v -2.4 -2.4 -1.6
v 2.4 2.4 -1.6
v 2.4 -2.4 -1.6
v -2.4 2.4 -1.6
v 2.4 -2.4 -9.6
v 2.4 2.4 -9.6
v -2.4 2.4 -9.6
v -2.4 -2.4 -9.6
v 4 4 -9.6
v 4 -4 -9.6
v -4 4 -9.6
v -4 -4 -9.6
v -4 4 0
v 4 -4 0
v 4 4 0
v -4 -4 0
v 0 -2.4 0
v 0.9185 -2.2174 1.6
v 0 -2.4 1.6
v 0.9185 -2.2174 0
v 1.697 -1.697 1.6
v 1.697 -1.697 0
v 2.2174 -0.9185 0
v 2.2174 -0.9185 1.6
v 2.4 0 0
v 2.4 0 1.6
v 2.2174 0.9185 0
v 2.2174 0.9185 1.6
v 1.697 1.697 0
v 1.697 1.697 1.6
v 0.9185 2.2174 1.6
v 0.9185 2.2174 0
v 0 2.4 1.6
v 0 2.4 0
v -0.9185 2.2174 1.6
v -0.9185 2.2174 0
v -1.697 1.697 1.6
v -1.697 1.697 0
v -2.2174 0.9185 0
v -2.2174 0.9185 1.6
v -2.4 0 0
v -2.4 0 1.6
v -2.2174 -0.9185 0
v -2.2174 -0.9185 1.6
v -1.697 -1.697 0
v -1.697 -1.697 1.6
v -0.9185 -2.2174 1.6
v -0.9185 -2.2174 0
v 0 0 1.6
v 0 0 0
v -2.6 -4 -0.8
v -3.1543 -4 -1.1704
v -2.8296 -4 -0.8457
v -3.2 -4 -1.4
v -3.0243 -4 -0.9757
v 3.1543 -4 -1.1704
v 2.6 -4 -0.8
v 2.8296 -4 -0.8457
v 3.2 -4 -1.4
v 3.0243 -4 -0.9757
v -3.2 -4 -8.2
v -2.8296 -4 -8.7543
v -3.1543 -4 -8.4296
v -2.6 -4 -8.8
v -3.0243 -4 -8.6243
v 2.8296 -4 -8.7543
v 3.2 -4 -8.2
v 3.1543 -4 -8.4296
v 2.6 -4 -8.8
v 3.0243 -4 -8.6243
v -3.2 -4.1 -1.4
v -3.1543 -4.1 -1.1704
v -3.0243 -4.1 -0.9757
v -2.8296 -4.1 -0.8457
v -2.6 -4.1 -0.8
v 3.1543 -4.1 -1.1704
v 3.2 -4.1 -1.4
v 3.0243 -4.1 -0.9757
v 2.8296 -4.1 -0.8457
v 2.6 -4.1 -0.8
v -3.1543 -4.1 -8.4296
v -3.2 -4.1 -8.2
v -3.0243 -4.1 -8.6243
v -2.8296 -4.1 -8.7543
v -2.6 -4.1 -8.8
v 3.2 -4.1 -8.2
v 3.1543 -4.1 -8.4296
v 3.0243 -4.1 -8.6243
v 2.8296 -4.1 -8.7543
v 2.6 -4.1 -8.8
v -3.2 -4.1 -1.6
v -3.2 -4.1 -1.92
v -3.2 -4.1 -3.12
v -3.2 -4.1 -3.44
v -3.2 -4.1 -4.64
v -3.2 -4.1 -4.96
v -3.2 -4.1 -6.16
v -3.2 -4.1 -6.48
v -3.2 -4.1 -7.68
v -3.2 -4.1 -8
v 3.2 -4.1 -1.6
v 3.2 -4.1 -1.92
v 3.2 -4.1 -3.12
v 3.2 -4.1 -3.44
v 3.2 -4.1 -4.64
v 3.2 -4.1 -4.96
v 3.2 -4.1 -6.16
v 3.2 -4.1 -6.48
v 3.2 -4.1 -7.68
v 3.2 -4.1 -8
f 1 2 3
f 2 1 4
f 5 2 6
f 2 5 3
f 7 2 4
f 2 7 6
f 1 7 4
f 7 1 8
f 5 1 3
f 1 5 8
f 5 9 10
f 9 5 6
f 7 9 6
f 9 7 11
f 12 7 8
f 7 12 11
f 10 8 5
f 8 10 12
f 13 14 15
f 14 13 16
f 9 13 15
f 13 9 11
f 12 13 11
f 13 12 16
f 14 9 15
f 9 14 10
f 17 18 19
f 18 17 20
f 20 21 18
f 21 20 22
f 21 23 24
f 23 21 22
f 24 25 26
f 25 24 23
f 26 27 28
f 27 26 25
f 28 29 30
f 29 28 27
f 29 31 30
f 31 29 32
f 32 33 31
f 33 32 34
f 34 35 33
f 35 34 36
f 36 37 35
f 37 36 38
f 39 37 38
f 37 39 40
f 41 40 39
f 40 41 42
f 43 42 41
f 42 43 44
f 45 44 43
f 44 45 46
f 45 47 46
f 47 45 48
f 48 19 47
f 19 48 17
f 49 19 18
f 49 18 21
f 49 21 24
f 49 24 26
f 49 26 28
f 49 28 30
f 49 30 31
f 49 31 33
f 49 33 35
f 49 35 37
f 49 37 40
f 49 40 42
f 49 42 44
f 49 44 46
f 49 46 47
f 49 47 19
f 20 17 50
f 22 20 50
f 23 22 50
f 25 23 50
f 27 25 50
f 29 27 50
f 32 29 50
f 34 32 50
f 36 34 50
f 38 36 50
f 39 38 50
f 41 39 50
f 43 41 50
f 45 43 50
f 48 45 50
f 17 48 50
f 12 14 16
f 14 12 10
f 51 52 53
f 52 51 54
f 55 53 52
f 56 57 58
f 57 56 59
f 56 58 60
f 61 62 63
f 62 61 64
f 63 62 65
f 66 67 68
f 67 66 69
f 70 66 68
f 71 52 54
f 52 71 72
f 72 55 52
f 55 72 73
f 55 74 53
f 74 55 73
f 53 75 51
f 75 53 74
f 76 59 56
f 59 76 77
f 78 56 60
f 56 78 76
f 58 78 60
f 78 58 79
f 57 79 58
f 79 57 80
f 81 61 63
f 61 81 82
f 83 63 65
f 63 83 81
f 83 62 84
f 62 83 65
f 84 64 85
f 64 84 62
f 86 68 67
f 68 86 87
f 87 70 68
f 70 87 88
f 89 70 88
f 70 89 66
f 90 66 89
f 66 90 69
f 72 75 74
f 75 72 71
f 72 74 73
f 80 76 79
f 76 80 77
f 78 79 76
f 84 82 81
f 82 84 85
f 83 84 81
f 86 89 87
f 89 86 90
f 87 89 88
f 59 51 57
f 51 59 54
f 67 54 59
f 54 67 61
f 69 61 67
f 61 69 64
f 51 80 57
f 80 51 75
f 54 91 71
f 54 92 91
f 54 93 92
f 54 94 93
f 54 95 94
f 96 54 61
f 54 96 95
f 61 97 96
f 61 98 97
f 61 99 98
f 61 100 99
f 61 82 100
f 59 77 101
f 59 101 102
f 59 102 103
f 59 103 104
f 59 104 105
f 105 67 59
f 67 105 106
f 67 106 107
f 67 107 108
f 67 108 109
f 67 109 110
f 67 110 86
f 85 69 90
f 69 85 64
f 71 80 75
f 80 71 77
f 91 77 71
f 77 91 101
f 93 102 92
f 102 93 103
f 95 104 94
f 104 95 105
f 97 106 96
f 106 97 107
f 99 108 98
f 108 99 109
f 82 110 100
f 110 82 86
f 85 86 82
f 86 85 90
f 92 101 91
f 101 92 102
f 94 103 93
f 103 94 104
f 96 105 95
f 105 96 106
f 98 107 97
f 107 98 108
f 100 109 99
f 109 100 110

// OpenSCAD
// file: ../p/4-4edge.scad
use <../lib.scad>
function ldraw_lib__4_4edge() = [
// 0 Circle 1.0
// 0 Name: 4-4edge.dat
// 0 Author: James Jessiman
// 0 !LDRAW_ORG Primitive UPDATE 2017-01
// 0 !LICENSE Licensed under CC BY 2.0 and CC BY 4.0 : see CAreadme.txt
// 
// 0 BFC CERTIFY CCW
  [0,"BFC","CERTIFY"],
  [0,"BFC","CCW"],
// 
// 0 !HISTORY 1998-12-15 [PTadmin] Official Update 1998-10
// 0 !HISTORY 2005-12-28 [PTadmin] Official Update 2005-01
// 0 !HISTORY 2007-06-24 [PTadmin] Header formatted for Contributor Agreement
// 0 !HISTORY 2008-07-01 [PTadmin] Official Update 2008-01
// 0 !HISTORY 2017-01-15 [Steffen] BFCed
// 0 !HISTORY 2017-12-30 [PTadmin] Official Update 2017-01
// 
// 
// 2 24 1 0 0 0.9239 0 0.3827
  [2,24,1,0,0,0.9239,0,0.3827],
// 2 24 0.9239 0 0.3827 0.7071 0 0.7071
  [2,24,0.9239,0,0.3827,0.7071,0,0.7071],
// 2 24 0.7071 0 0.7071 0.3827 0 0.9239
  [2,24,0.7071,0,0.7071,0.3827,0,0.9239],
// 2 24 0.3827 0 0.9239 0 0 1
  [2,24,0.3827,0,0.9239,0,0,1],
// 2 24 0 0 1 -0.3827 0 0.9239
  [2,24,0,0,1,-0.3827,0,0.9239],
// 2 24 -0.3827 0 0.9239 -0.7071 0 0.7071
  [2,24,-0.3827,0,0.9239,-0.7071,0,0.7071],
// 2 24 -0.7071 0 0.7071 -0.9239 0 0.3827
  [2,24,-0.7071,0,0.7071,-0.9239,0,0.3827],
// 2 24 -0.9239 0 0.3827 -1 0 -0
  [2,24,-0.9239,0,0.3827,-1,0,-0],
// 2 24 -1 0 -0 -0.9239 0 -0.3827
  [2,24,-1,0,-0,-0.9239,0,-0.3827],
// 2 24 -0.9239 0 -0.3827 -0.7071 0 -0.7071
  [2,24,-0.9239,0,-0.3827,-0.7071,0,-0.7071],
// 2 24 -0.7071 0 -0.7071 -0.3827 0 -0.9239
  [2,24,-0.7071,0,-0.7071,-0.3827,0,-0.9239],
// 2 24 -0.3827 0 -0.9239 0 0 -1
  [2,24,-0.3827,0,-0.9239,0,0,-1],
// 2 24 0 0 -1 0.3827 0 -0.9239
  [2,24,0,0,-1,0.3827,0,-0.9239],
// 2 24 0.3827 0 -0.9239 0.7071 0 -0.7071
  [2,24,0.3827,0,-0.9239,0.7071,0,-0.7071],
// 2 24 0.7071 0 -0.7071 0.9239 0 -0.3827
  [2,24,0.7071,0,-0.7071,0.9239,0,-0.3827],
// 2 24 0.9239 0 -0.3827 1 0 0
  [2,24,0.9239,0,-0.3827,1,0,0],
];
module ldraw_lib__4_4edge(step=0, col=false, unit=2/5, alt=false, line=0.2, solid=!$preview)
    makepoly(ldraw_lib__4_4edge(), step=step, col=col, unit=unit, alt=alt, line=line, solid=solid);
ldraw_lib__4_4edge(line=0.2);
// file: ../p/4-4disc.scad
use <../lib.scad>
function ldraw_lib__4_4disc() = [
// 0 Disc 1.0
// 0 Name: 4-4disc.dat
// 0 Author: James Jessiman
// 0 !LDRAW_ORG Primitive UPDATE 2002-02
// 0 !LICENSE Licensed under CC BY 2.0 and CC BY 4.0 : see CAreadme.txt
// 
// 0 BFC CERTIFY CCW
  [0,"BFC","CERTIFY"],
  [0,"BFC","CCW"],
// 
// 0 !HISTORY 1998-12-15 [PTadmin] Official Update 1998-10
// 0 !HISTORY 2002-03-23 [sbliss] Added BFC statement
// 0 !HISTORY 2002-04-25 [PTadmin] Official Update 2002-02
// 0 !HISTORY 2007-06-24 [PTadmin] Header formatted for Contributor Agreement
// 0 !HISTORY 2008-07-01 [PTadmin] Official Update 2008-01
// 
// 
// 3 16 0 0 0 1 0 0 0.9239 0 0.3827
  [3,16,0,0,0,1,0,0,0.9239,0,0.3827],
// 3 16 0 0 0 0.9239 0 0.3827 0.7071 0 0.7071
  [3,16,0,0,0,0.9239,0,0.3827,0.7071,0,0.7071],
// 3 16 0 0 0 0.7071 0 0.7071 0.3827 0 0.9239
  [3,16,0,0,0,0.7071,0,0.7071,0.3827,0,0.9239],
// 3 16 0 0 0 0.3827 0 0.9239 0 0 1
  [3,16,0,0,0,0.3827,0,0.9239,0,0,1],
// 3 16 0 0 0 0 0 1 -0.3827 0 0.9239
  [3,16,0,0,0,0,0,1,-0.3827,0,0.9239],
// 3 16 0 0 0 -0.3827 0 0.9239 -0.7071 0 0.7071
  [3,16,0,0,0,-0.3827,0,0.9239,-0.7071,0,0.7071],
// 3 16 0 0 0 -0.7071 0 0.7071 -0.9239 0 0.3827
  [3,16,0,0,0,-0.7071,0,0.7071,-0.9239,0,0.3827],
// 3 16 0 0 0 -0.9239 0 0.3827 -1 0 -0
  [3,16,0,0,0,-0.9239,0,0.3827,-1,0,-0],
// 3 16 0 0 0 -1 0 -0 -0.9239 0 -0.3827
  [3,16,0,0,0,-1,0,-0,-0.9239,0,-0.3827],
// 3 16 0 0 0 -0.9239 0 -0.3827 -0.7071 0 -0.7071
  [3,16,0,0,0,-0.9239,0,-0.3827,-0.7071,0,-0.7071],
// 3 16 0 0 0 -0.7071 0 -0.7071 -0.3827 0 -0.9239
  [3,16,0,0,0,-0.7071,0,-0.7071,-0.3827,0,-0.9239],
// 3 16 0 0 0 -0.3827 0 -0.9239 0 0 -1
  [3,16,0,0,0,-0.3827,0,-0.9239,0,0,-1],
// 3 16 0 0 0 0 0 -1 0.3827 0 -0.9239
  [3,16,0,0,0,0,0,-1,0.3827,0,-0.9239],
// 3 16 0 0 0 0.3827 0 -0.9239 0.7071 0 -0.7071
  [3,16,0,0,0,0.3827,0,-0.9239,0.7071,0,-0.7071],
// 3 16 0 0 0 0.7071 0 -0.7071 0.9239 0 -0.3827
  [3,16,0,0,0,0.7071,0,-0.7071,0.9239,0,-0.3827],
// 3 16 0 0 0 0.9239 0 -0.3827 1 0 0
  [3,16,0,0,0,0.9239,0,-0.3827,1,0,0],
// 0
];
module ldraw_lib__4_4disc(step=0, col=false, unit=2/5, alt=false, line=0.2, solid=!$preview)
    makepoly(ldraw_lib__4_4disc(), step=step, col=col, unit=unit, alt=alt, line=line, solid=solid);
ldraw_lib__4_4disc(line=0.2);
// file: ../p/4-4cyli.scad
use <../lib.scad>
$fa=1; $fs=0.2;
function ldraw_lib__4_4cyli(realsolid=false) = [
// 0 Cylinder 1.0
// 0 Name: 4-4cyli.dat
// 0 Author: James Jessiman
// 0 !LDRAW_ORG Primitive UPDATE 2005-01
// 0 !LICENSE Licensed under CC BY 2.0 and CC BY 4.0 : see CAreadme.txt
// 
// 0 BFC CERTIFY CCW
  [0,"BFC","CERTIFY"],
  [0,"BFC","CCW"],
// 
// 0 !HISTORY 1998-12-15 [PTadmin] Official Update 1998-10
// 0 !HISTORY 2002-03-23 [sbliss] Added BFC statement; merged headers from files in distributions LDraw 0.27 and Complete.
// 0 !HISTORY 2002-04-25 [PTadmin] Official Update 2002-02
// 0 !HISTORY 2004-12-14 [guyvivan] BFC CCW
// 0 !HISTORY 2005-12-28 [PTadmin] Official Update 2005-01
// 0 !HISTORY 2007-06-24 [PTadmin] Header formatted for Contributor Agreement
// 0 !HISTORY 2008-07-01 [PTadmin] Official Update 2008-01
// 
// 
// 4 16 1 1 0 0.9239 1 0.3827 0.9239 0 0.3827 1 0 0
  [4,16,1,1,0,0.9239,1,0.3827,0.9239,0,0.3827,1,0,0],
// 5 24 1 0 0 1 1 0 0.9239 0 0.3827 0.9239 0 -0.3827
  [5,24,1,0,0,1,1,0,0.9239,0,0.3827,0.9239,0,-0.3827],
// 4 16 0.9239 1 0.3827 0.7071 1 0.7071 0.7071 0 0.7071 0.9239 0 0.3827
  [4,16,0.9239,1,0.3827,0.7071,1,0.7071,0.7071,0,0.7071,0.9239,0,0.3827],
// 5 24 0.9239 0 0.3827 0.9239 1 0.3827 0.7071 0 0.7071 1 0 0
  [5,24,0.9239,0,0.3827,0.9239,1,0.3827,0.7071,0,0.7071,1,0,0],
// 4 16 0.7071 1 0.7071 0.3827 1 0.9239 0.3827 0 0.9239 0.7071 0 0.7071
  [4,16,0.7071,1,0.7071,0.3827,1,0.9239,0.3827,0,0.9239,0.7071,0,0.7071],
// 5 24 0.7071 0 0.7071 0.7071 1 0.7071 0.3827 0 0.9239 0.9239 0 0.3827
  [5,24,0.7071,0,0.7071,0.7071,1,0.7071,0.3827,0,0.9239,0.9239,0,0.3827],
// 4 16 0.3827 1 0.9239 0 1 1 0 0 1 0.3827 0 0.9239
  [4,16,0.3827,1,0.9239,0,1,1,0,0,1,0.3827,0,0.9239],
// 5 24 0.3827 0 0.9239 0.3827 1 0.9239 0 0 1 0.7071 0 0.7071
  [5,24,0.3827,0,0.9239,0.3827,1,0.9239,0,0,1,0.7071,0,0.7071],
// 4 16 0 1 1 -0.3827 1 0.9239 -0.3827 0 0.9239 0 0 1
  [4,16,0,1,1,-0.3827,1,0.9239,-0.3827,0,0.9239,0,0,1],
// 5 24 0 0 1 0 1 1 -0.3827 0 0.9239 0.3827 0 0.9239
  [5,24,0,0,1,0,1,1,-0.3827,0,0.9239,0.3827,0,0.9239],
// 4 16 -0.3827 1 0.9239 -0.7071 1 0.7071 -0.7071 0 0.7071 -0.3827 0 0.9239
  [4,16,-0.3827,1,0.9239,-0.7071,1,0.7071,-0.7071,0,0.7071,-0.3827,0,0.9239],
// 5 24 -0.3827 0 0.9239 -0.3827 1 0.9239 -0.7071 0 0.7071 0 0 1
  [5,24,-0.3827,0,0.9239,-0.3827,1,0.9239,-0.7071,0,0.7071,0,0,1],
// 4 16 -0.7071 1 0.7071 -0.9239 1 0.3827 -0.9239 0 0.3827 -0.7071 0 0.7071
  [4,16,-0.7071,1,0.7071,-0.9239,1,0.3827,-0.9239,0,0.3827,-0.7071,0,0.7071],
// 5 24 -0.7071 0 0.7071 -0.7071 1 0.7071 -0.9239 0 0.3827 -0.3827 0 0.9239
  [5,24,-0.7071,0,0.7071,-0.7071,1,0.7071,-0.9239,0,0.3827,-0.3827,0,0.9239],
// 4 16 -0.9239 1 0.3827 -1 1 0 -1 0 0 -0.9239 0 0.3827
  [4,16,-0.9239,1,0.3827,-1,1,0,-1,0,0,-0.9239,0,0.3827],
// 5 24 -0.9239 0 0.3827 -0.9239 1 0.3827 -1 0 0 -0.7071 0 0.7071
  [5,24,-0.9239,0,0.3827,-0.9239,1,0.3827,-1,0,0,-0.7071,0,0.7071],
// 4 16 -1 1 0 -0.9239 1 -0.3827 -0.9239 0 -0.3827 -1 0 0
  [4,16,-1,1,0,-0.9239,1,-0.3827,-0.9239,0,-0.3827,-1,0,0],
// 5 24 -1 0 0 -1 1 0 -0.9239 0 -0.3827 -0.9239 0 0.3827
  [5,24,-1,0,0,-1,1,0,-0.9239,0,-0.3827,-0.9239,0,0.3827],
// 4 16 -0.9239 1 -0.3827 -0.7071 1 -0.7071 -0.7071 0 -0.7071 -0.9239 0 -0.3827
  [4,16,-0.9239,1,-0.3827,-0.7071,1,-0.7071,-0.7071,0,-0.7071,-0.9239,0,-0.3827],
// 5 24 -0.9239 0 -0.3827 -0.9239 1 -0.3827 -0.7071 0 -0.7071 -1 0 0
  [5,24,-0.9239,0,-0.3827,-0.9239,1,-0.3827,-0.7071,0,-0.7071,-1,0,0],
// 4 16 -0.7071 1 -0.7071 -0.3827 1 -0.9239 -0.3827 0 -0.9239 -0.7071 0 -0.7071
  [4,16,-0.7071,1,-0.7071,-0.3827,1,-0.9239,-0.3827,0,-0.9239,-0.7071,0,-0.7071],
// 5 24 -0.7071 0 -0.7071 -0.7071 1 -0.7071 -0.3827 0 -0.9239 -0.9239 0 -0.3827
  [5,24,-0.7071,0,-0.7071,-0.7071,1,-0.7071,-0.3827,0,-0.9239,-0.9239,0,-0.3827],
// 4 16 -0.3827 1 -0.9239 0 1 -1 0 0 -1 -0.3827 0 -0.9239
  [4,16,-0.3827,1,-0.9239,0,1,-1,0,0,-1,-0.3827,0,-0.9239],
// 5 24 -0.3827 0 -0.9239 -0.3827 1 -0.9239 0 0 -1 -0.7071 0 -0.7071
  [5,24,-0.3827,0,-0.9239,-0.3827,1,-0.9239,0,0,-1,-0.7071,0,-0.7071],
// 4 16 0 1 -1 0.3827 1 -0.9239 0.3827 0 -0.9239 0 0 -1
  [4,16,0,1,-1,0.3827,1,-0.9239,0.3827,0,-0.9239,0,0,-1],
// 5 24 0 0 -1 0 1 -1 0.3827 0 -0.9239 -0.3827 0 -0.9239
  [5,24,0,0,-1,0,1,-1,0.3827,0,-0.9239,-0.3827,0,-0.9239],
// 4 16 0.3827 1 -0.9239 0.7071 1 -0.7071 0.7071 0 -0.7071 0.3827 0 -0.9239
  [4,16,0.3827,1,-0.9239,0.7071,1,-0.7071,0.7071,0,-0.7071,0.3827,0,-0.9239],
// 5 24 0.3827 0 -0.9239 0.3827 1 -0.9239 0.7071 0 -0.7071 0 0 -1
  [5,24,0.3827,0,-0.9239,0.3827,1,-0.9239,0.7071,0,-0.7071,0,0,-1],
// 4 16 0.7071 1 -0.7071 0.9239 1 -0.3827 0.9239 0 -0.3827 0.7071 0 -0.7071
  [4,16,0.7071,1,-0.7071,0.9239,1,-0.3827,0.9239,0,-0.3827,0.7071,0,-0.7071],
// 5 24 0.7071 0 -0.7071 0.7071 1 -0.7071 0.9239 0 -0.3827 0.3827 0 -0.9239
  [5,24,0.7071,0,-0.7071,0.7071,1,-0.7071,0.9239,0,-0.3827,0.3827,0,-0.9239],
// 4 16 0.9239 1 -0.3827 1 1 0 1 0 0 0.9239 0 -0.3827
  [4,16,0.9239,1,-0.3827,1,1,0,1,0,0,0.9239,0,-0.3827],
// 5 24 0.9239 0 -0.3827 0.9239 1 -0.3827 1 0 0 0.7071 0 -0.7071
  [5,24,0.9239,0,-0.3827,0.9239,1,-0.3827,1,0,0,0.7071,0,-0.7071],
// 0
];
module ldraw_lib__4_4cyli(step=0, col=false, unit=2/5, alt=false, line=0.2, solid=!$preview)
    makepoly(ldraw_lib__4_4cyli(solid), step=step, col=col, unit=unit, alt=alt, line=line, solid=solid);
ldraw_lib__4_4cyli(line=0.2);
// file: ../p/stud.scad
use <../lib.scad>
use <4-4cyli.scad>
use <4-4disc.scad>
use <4-4edge.scad>
function ldraw_lib__stud() = [
// 0 Stud
// 0 Name: stud.dat
// 0 Author: James Jessiman
// 0 !LDRAW_ORG Primitive UPDATE 2012-01
// 0 !LICENSE Licensed under CC BY 4.0 : see CAreadme.txt
// 
// 0 BFC CERTIFY CCW
  [0,"BFC","CERTIFY"],
  [0,"BFC","CCW"],
// 
// 0 !HISTORY 2002-04-04 [sbliss] Modified for BFC compliance
// 0 !HISTORY 2002-04-25 [PTadmin] Official Update 2002-02
// 0 !HISTORY 2007-06-24 [PTadmin] Header formatted for Contributor Agreement
// 0 !HISTORY 2008-07-01 [PTadmin] Official Update 2008-01
// 0 !HISTORY 2012-02-16 [Philo] Changed to CCW
// 0 !HISTORY 2012-03-30 [PTadmin] Official Update 2012-01
// 
// 
// 1 16 0 0 0 6 0 0 0 1 0 0 0 6 4-4edge.dat
  [1,16,0,0,0,6,0,0,0,1,0,0,0,6, ldraw_lib__4_4edge()],
// 1 16 0 -4 0 6 0 0 0 1 0 0 0 6 4-4edge.dat
  [1,16,0,-4,0,6,0,0,0,1,0,0,0,6, ldraw_lib__4_4edge()],
// 1 16 0 0 0 6 0 0 0 -4 0 0 0 6 4-4cyli.dat
  [1,16,0,0,0,6,0,0,0,-4,0,0,0,6, ldraw_lib__4_4cyli()],
// 1 16 0 -4 0 6 0 0 0 1 0 0 0 6 4-4disc.dat
  [1,16,0,-4,0,6,0,0,0,1,0,0,0,6, ldraw_lib__4_4disc()],
  [-1,16,0,0,0,6,0,0,0,-1,0,0,0,6, ldraw_lib__4_4disc()],
];
module ldraw_lib__stud(step=0, col=false, unit=2/5, alt=false, line=0.2, solid=!$preview)
    makepoly(ldraw_lib__stud(), step=step, col=col, unit=unit, alt=alt, line=line, solid=solid);
ldraw_lib__stud(line=0.2);
// file: ../p/box5.scad
use <../lib.scad>
function ldraw_lib__box5() = [
// 0 Box with 5 Faces and All Edges
// 0 Name: box5.dat
// 0 Author: James Jessiman
// 0 !LDRAW_ORG Primitive UPDATE 2012-01
// 0 !LICENSE Licensed under CC BY 2.0 and CC BY 4.0 : see CAreadme.txt
// 
// 0 BFC CERTIFY CCW
  [0,"BFC","CERTIFY"],
  [0,"BFC","CCW"],
// 
// 0 !HISTORY 2002-04-03 [sbliss] Modified for BFC compliance
// 0 !HISTORY 2002-04-25 [PTadmin] Official Update 2002-02
// 0 !HISTORY 2007-06-24 [PTadmin] Header formatted for Contributor Agreement
// 0 !HISTORY 2008-07-01 [PTadmin] Official Update 2008-01
// 0 !HISTORY 2012-02-16 [Philo] Changed to CCW
// 0 !HISTORY 2012-03-30 [PTadmin] Official Update 2012-01
// 
// 
// 2 24 1 1 1 -1 1 1
  [2,24,1,1,1,-1,1,1],
// 2 24 -1 1 1 -1 1 -1
  [2,24,-1,1,1,-1,1,-1],
// 2 24 -1 1 -1 1 1 -1
  [2,24,-1,1,-1,1,1,-1],
// 2 24 1 1 -1 1 1 1
  [2,24,1,1,-1,1,1,1],
// 2 24 1 0 1 -1 0 1
  [2,24,1,0,1,-1,0,1],
// 2 24 -1 0 1 -1 0 -1
  [2,24,-1,0,1,-1,0,-1],
// 2 24 -1 0 -1 1 0 -1
  [2,24,-1,0,-1,1,0,-1],
// 2 24 1 0 -1 1 0 1
  [2,24,1,0,-1,1,0,1],
// 2 24 1 0 1 1 1 1
  [2,24,1,0,1,1,1,1],
// 2 24 -1 0 1 -1 1 1
  [2,24,-1,0,1,-1,1,1],
// 2 24 1 0 -1 1 1 -1
  [2,24,1,0,-1,1,1,-1],
// 2 24 -1 0 -1 -1 1 -1
  [2,24,-1,0,-1,-1,1,-1],
// 4 16 -1 1 1 1 1 1 1 1 -1 -1 1 -1
  [4,16,-1,1,1,1,1,1,1,1,-1,-1,1,-1],
// 4 16 -1 1 1 -1 0 1 1 0 1 1 1 1
  [4,16,-1,1,1,-1,0,1,1,0,1,1,1,1],
// 4 16 -1 1 -1 -1 0 -1 -1 0 1 -1 1 1
  [4,16,-1,1,-1,-1,0,-1,-1,0,1,-1,1,1],
// 4 16 1 1 -1 1 0 -1 -1 0 -1 -1 1 -1
  [4,16,1,1,-1,1,0,-1,-1,0,-1,-1,1,-1],
// 4 16 1 1 1 1 0 1 1 0 -1 1 1 -1
  [4,16,1,1,1,1,0,1,1,0,-1,1,1,-1],
];
makepoly(ldraw_lib__box5(), line=0.2);
// file: ../p/box4t.scad
use <../lib.scad>
function ldraw_lib__box4t() = [
// 0 Box with 4 Adjacent Faces and All Edges
// 0 Name: box4t.dat
// 0 Author: Tore Eriksson [Tore_Eriksson]
// 0 !LDRAW_ORG Primitive UPDATE 2003-02
// 0 !LICENSE Licensed under CC BY 2.0 and CC BY 4.0 : see CAreadme.txt
// 
// 0 BFC CERTIFY CCW
  [0,"BFC","CERTIFY"],
  [0,"BFC","CCW"],
// 
// 0 !HISTORY 1997-09-29 [PTadmin] Official Update 1997-15
// 0 !HISTORY 2002-08-31 [izanette] Modified with WINDZ for BFC compliance
// 0 !HISTORY 2003-08-01 [PTadmin] Official Update 2003-02
// 0 !HISTORY 2007-06-24 [PTadmin] Header formatted for Contributor Agreement
// 0 !HISTORY 2008-07-01 [PTadmin] Official Update 2008-01
// 
// 
// 2 24 1 1 1 -1 1 1
  [2,24,1,1,1,-1,1,1],
// 2 24 -1 1 1 -1 1 -1
  [2,24,-1,1,1,-1,1,-1],
// 2 24 -1 1 -1 1 1 -1
  [2,24,-1,1,-1,1,1,-1],
// 2 24 1 1 -1 1 1 1
  [2,24,1,1,-1,1,1,1],
// 2 24 1 0 1 -1 0 1
  [2,24,1,0,1,-1,0,1],
// 2 24 -1 0 1 -1 0 -1
  [2,24,-1,0,1,-1,0,-1],
// 2 24 -1 0 -1 1 0 -1
  [2,24,-1,0,-1,1,0,-1],
// 2 24 1 0 -1 1 0 1
  [2,24,1,0,-1,1,0,1],
// 2 24 1 0 1 1 1 1
  [2,24,1,0,1,1,1,1],
// 2 24 -1 0 1 -1 1 1
  [2,24,-1,0,1,-1,1,1],
// 2 24 1 0 -1 1 1 -1
  [2,24,1,0,-1,1,1,-1],
// 2 24 -1 0 -1 -1 1 -1
  [2,24,-1,0,-1,-1,1,-1],
// 4 16 1 1 1 1 1 -1 -1 1 -1 -1 1 1
  [4,16,1,1,1,1,1,-1,-1,1,-1,-1,1,1],
// 4 16 1 1 1 -1 1 1 -1 0 1 1 0 1
  [4,16,1,1,1,-1,1,1,-1,0,1,1,0,1],
// 4 16 -1 1 1 -1 1 -1 -1 0 -1 -1 0 1
  [4,16,-1,1,1,-1,1,-1,-1,0,-1,-1,0,1],
// 0 4 16 -1 1 -1 -1 0 -1 1 0 -1 1 1 -1
// 4 16 1 1 -1 1 1 1 1 0 1 1 0 -1
  [4,16,1,1,-1,1,1,1,1,0,1,1,0,-1],
// 0
];
makepoly(ldraw_lib__box4t(), line=0.2);
// file: ../p/1-4cyli.scad
use <../lib.scad>
function ldraw_lib__1_4cyli() = [
// 0 Cylinder 0.25
// 0 Name: 1-4cyli.dat
// 0 Author: James Jessiman
// 0 !LDRAW_ORG Primitive UPDATE 2012-01
// 0 !LICENSE Licensed under CC BY 2.0 and CC BY 4.0 : see CAreadme.txt
// 
// 0 BFC CERTIFY CCW
  [0,"BFC","CERTIFY"],
  [0,"BFC","CCW"],
// 
// 0 !HISTORY 2002-03-23 [sbliss] Added BFC statement.
// 0 !HISTORY 2002-04-25 [PTadmin] Official Update 2002-02
// 0 !HISTORY 2007-06-22 [PTadmin] Header formatted for Contributor Agreement
// 0 !HISTORY 2008-07-01 [PTadmin] Official Update 2008-01
// 0 !HISTORY 2012-02-16 [Philo] Changed to CCW
// 0 !HISTORY 2012-03-30 [PTadmin] Official Update 2012-01
// 
// 
// 4 16 1 1 0 0.9239 1 0.3827 0.9239 0 0.3827 1 0 0
  [4,16,1,1,0,0.9239,1,0.3827,0.9239,0,0.3827,1,0,0],
// 5 24 1 0 0 1 1 0 0.9239 0 0.3827 1 0 -1
  [5,24,1,0,0,1,1,0,0.9239,0,0.3827,1,0,-1],
// 4 16 0.9239 1 0.3827 0.7071 1 0.7071 0.7071 0 0.7071 0.9239 0 0.3827
  [4,16,0.9239,1,0.3827,0.7071,1,0.7071,0.7071,0,0.7071,0.9239,0,0.3827],
// 5 24 0.9239 0 0.3827 0.9239 1 0.3827 0.7071 0 0.7071 1 0 0
  [5,24,0.9239,0,0.3827,0.9239,1,0.3827,0.7071,0,0.7071,1,0,0],
// 4 16 0.7071 1 0.7071 0.3827 1 0.9239 0.3827 0 0.9239 0.7071 0 0.7071
  [4,16,0.7071,1,0.7071,0.3827,1,0.9239,0.3827,0,0.9239,0.7071,0,0.7071],
// 5 24 0.7071 0 0.7071 0.7071 1 0.7071 0.3827 0 0.9239 0.9239 0 0.3827
  [5,24,0.7071,0,0.7071,0.7071,1,0.7071,0.3827,0,0.9239,0.9239,0,0.3827],
// 4 16 0.3827 1 0.9239 0 1 1 0 0 1 0.3827 0 0.9239
  [4,16,0.3827,1,0.9239,0,1,1,0,0,1,0.3827,0,0.9239],
// 5 24 0.3827 0 0.9239 0.3827 1 0.9239 0 0 1 0.7071 0 0.7071
  [5,24,0.3827,0,0.9239,0.3827,1,0.9239,0,0,1,0.7071,0,0.7071],
// 5 24 0 0 1 0 1 1 0.3827 0 0.9239 -1 0 1
  [5,24,0,0,1,0,1,1,0.3827,0,0.9239,-1,0,1],
];
module ldraw_lib__1_4cyli(step=0, col=false, unit=2/5, alt=false, line=0.2, solid=!$preview)
    makepoly(ldraw_lib__1_4cyli(), step=step, col=col, unit=unit, alt=alt, line=line, solid=solid);
ldraw_lib__1_4cyli(line=0.2);
// file: ../p/1-4chrd.scad
use <../lib.scad>
$fa=1; $fs=0.2;
function ldraw_lib__1_4chrd(realsolid=false) = [
// 0 Chord 0.25
// 0 Name: 1-4chrd.dat
// 0 Author: Tony Hafner [hafhead]
// 0 !LDRAW_ORG Primitive UPDATE 2012-02
// 0 !LICENSE Licensed under CC BY 2.0 and CC BY 4.0 : see CAreadme.txt
// 
// 0 BFC CERTIFY CCW
  [0,"BFC","CERTIFY"],
  [0,"BFC","CCW"],
// 
// 0 !HISTORY 2004-04-22 [PTadmin] Official Update 2004-02
// 0 !HISTORY 2007-10-09 [PTadmin] Header formatted for Contributor Agreement
// 0 !HISTORY 2008-07-01 [PTadmin] Official Update 2008-01
// 0 !HISTORY 2012-08-02 [MMR1988] Re-creation with PrimGen2 and Rectifier
// 0 !HISTORY 2012-08-09 [PTadmin] Official Update 2012-02
// 
// 
// 4 16 0.9239 0 0.3827 0.3827 0 0.9239 0 0 1 1 0 0
  [4,16,0.9239,0,0.3827,0.3827,0,0.9239,0,0,1,1,0,0],
// 3 16 0.7071 0 0.7071 0.3827 0 0.9239 0.9239 0 0.3827
  [3,16,0.7071,0,0.7071,0.3827,0,0.9239,0.9239,0,0.3827],
];
module ldraw_lib__1_4chrd(step=0, col=false, unit=2/5, alt=false, line=0.2, solid=!$preview)
    makepoly(ldraw_lib__1_4chrd(solid), step=step, col=col, unit=unit, alt=alt, line=line, solid=solid);
ldraw_lib__1_4chrd(line=0.2);
// file: s/3005s01.scad
use <../../lib.scad>
use <../../p/box4t.scad>
use <../../p/box5.scad>
use <../../p/stud.scad>
function ldraw_lib__s__3005s01() = [
// 0 ~Brick  1 x  1 without Front Face
// 0 Name: s\3005s01.dat
// 0 Author: John Riley [jriley]
// 0 !LDRAW_ORG Subpart UPDATE 2004-01
// 0 !LICENSE Licensed under CC BY 2.0 and CC BY 4.0 : see CAreadme.txt
// 
// 0 BFC CERTIFY CCW
  [0,"BFC","CERTIFY"],
  [0,"BFC","CCW"],
// 
// 0 !HISTORY 2003-09-07 [jriley] BFCed & Subfiled
// 0 !HISTORY 2004-03-02 [PTadmin] Official Update 2004-01
// 0 !HISTORY 2007-08-29 [PTadmin] Header formatted for Contributor Agreement
// 0 !HISTORY 2008-07-01 [PTadmin] Official Update 2008-01
// 
// 
// 0 BFC INVERTNEXT
  [0,"BFC","INVERTNEXT"],
// 1 16 0 24 0 0 0 6 0 -20 0 -6 0 0 box5.dat
  [1,16,0,24,0,0,0,6,0,-20,0,-6,0,0, ldraw_lib__box5()],
// 4 16 10 24 -10 6 24 -6 6 24 6 10 24 10
  [4,16,10,24,-10,6,24,-6,6,24,6,10,24,10],
// 4 16 10 24 10 6 24 6 -6 24 6 -10 24 10
  [4,16,10,24,10,6,24,6,-6,24,6,-10,24,10],
// 4 16 -10 24 10 -6 24 6 -6 24 -6 -10 24 -10
  [4,16,-10,24,10,-6,24,6,-6,24,-6,-10,24,-10],
// 4 16 -10 24 -10 -6 24 -6 6 24 -6 10 24 -10
  [4,16,-10,24,-10,-6,24,-6,6,24,-6,10,24,-10],
// 1 16 0 24 0 10 0 0 0 -24 0 0 0 10 box4t.dat
  [1,16,0,24,0,10,0,0,0,-24,0,0,0,10, ldraw_lib__box4t()],
// 1 16 0 0 0 0 0 1 0 1 0 -1 0 0 stud.dat
  [1,16,0,0,0,0,0,1,0,1,0,-1,0,0, ldraw_lib__stud()],
// 0
];
module ldraw_lib__s__3005s01(step=0, col=false, unit=2/5, alt=false, line=0.2, solid=!$preview)
    makepoly(ldraw_lib__s__3005s01(), step=step, col=col, unit=unit, alt=alt, line=line, solid=solid);
ldraw_lib__s__3005s01(line=0.2);
// file: 6142275h.scad
use <../lib.scad>
use <../p/1-4chrd.scad>
use <../p/1-4cyli.scad>
function ldraw_lib__6142275h() = [
// 0 Sticker  1 x  0.8 with  5 Dark Grey Stripes on Black Background
// 0 Name: 6142275h.dat
// 0 Author: Massimo Maso [Sirio]
// 0 !LDRAW_ORG Part UPDATE 2022-06
// 0 !LICENSE Licensed under CC BY 4.0 : see CAreadme.txt
// 
// 0 BFC CERTIFY CCW
  [0,"BFC","CERTIFY"],
  [0,"BFC","CCW"],
// 
// 0 !KEYWORDS Audi, e-tron, quattro, R18, Set 75872, Speed Champions
// 
// 0 !HISTORY 2022-12-20 [PTadmin] Official Update 2022-06
// 
// 
// 0 // Primitives
// 1 16 -6.5 0 8.5 -1.5 0 0 0 -1 0 0 0 1.5 1-4chrd.dat
  [1,16,-6.5,0,8.5,-1.5,0,0,0,-1,0,0,0,1.5, ldraw_lib__1_4chrd()],
// 1 16 6.5 0 8.5 1.5 0 0 0 -1 0 0 0 1.5 1-4chrd.dat
  [1,16,6.5,0,8.5,1.5,0,0,0,-1,0,0,0,1.5, ldraw_lib__1_4chrd()],
// 1 16 -6.5 0 -8.5 -1.5 0 0 0 -1 0 0 0 -1.5 1-4chrd.dat
  [1,16,-6.5,0,-8.5,-1.5,0,0,0,-1,0,0,0,-1.5, ldraw_lib__1_4chrd()],
// 1 16 6.5 0 -8.5 1.5 0 0 0 -1 0 0 0 -1.5 1-4chrd.dat
  [1,16,6.5,0,-8.5,1.5,0,0,0,-1,0,0,0,-1.5, ldraw_lib__1_4chrd()],
// 1 16 -6.5 0 8.5 -1.5 0 0 0 -.25 0 0 0 1.5 1-4cyli.dat
  [1,16,-6.5,0,8.5,-1.5,0,0,0,-.25,0,0,0,1.5, ldraw_lib__1_4cyli()],
// 1 16 6.5 0 8.5 1.5 0 0 0 -.25 0 0 0 1.5 1-4cyli.dat
  [1,16,6.5,0,8.5,1.5,0,0,0,-.25,0,0,0,1.5, ldraw_lib__1_4cyli()],
// 1 16 -6.5 0 -8.5 -1.5 0 0 0 -.25 0 0 0 -1.5 1-4cyli.dat
  [1,16,-6.5,0,-8.5,-1.5,0,0,0,-.25,0,0,0,-1.5, ldraw_lib__1_4cyli()],
// 1 16 6.5 0 -8.5 1.5 0 0 0 -.25 0 0 0 -1.5 1-4cyli.dat
  [1,16,6.5,0,-8.5,1.5,0,0,0,-.25,0,0,0,-1.5, ldraw_lib__1_4cyli()],
// 1 0 -6.5 -.25 8.5 -1.5 0 0 0 1 0 0 0 1.5 1-4chrd.dat
  [1,0,-6.5,-.25,8.5,-1.5,0,0,0,1,0,0,0,1.5, ldraw_lib__1_4chrd()],
// 1 0 6.5 -.25 8.5 1.5 0 0 0 1 0 0 0 1.5 1-4chrd.dat
  [1,0,6.5,-.25,8.5,1.5,0,0,0,1,0,0,0,1.5, ldraw_lib__1_4chrd()],
// 1 0 -6.5 -.25 -8.5 -1.5 0 0 0 1 0 0 0 -1.5 1-4chrd.dat
  [1,0,-6.5,-.25,-8.5,-1.5,0,0,0,1,0,0,0,-1.5, ldraw_lib__1_4chrd()],
// 1 0 6.5 -.25 -8.5 1.5 0 0 0 1 0 0 0 -1.5 1-4chrd.dat
  [1,0,6.5,-.25,-8.5,1.5,0,0,0,1,0,0,0,-1.5, ldraw_lib__1_4chrd()],
// 0 // Bottom faces
// 4 16 6.5 0 10 8 0 8.5 -8 0 8.5 -6.5 0 10
  [4,16,6.5,0,10,8,0,8.5,-8,0,8.5,-6.5,0,10],
// 4 16 -8 0 8.5 8 0 8.5 8 0 -8.5 -8 0 -8.5
  [4,16,-8,0,8.5,8,0,8.5,8,0,-8.5,-8,0,-8.5],
// 4 16 6.5 0 -10 -6.5 0 -10 -8 0 -8.5 8 0 -8.5
  [4,16,6.5,0,-10,-6.5,0,-10,-8,0,-8.5,8,0,-8.5],
// 0 // Lateral faces
// 4 16 -6.5 0 10 -6.5 -.25 10 6.5 -.25 10 6.5 0 10
  [4,16,-6.5,0,10,-6.5,-.25,10,6.5,-.25,10,6.5,0,10],
// 3 16 -8 0 8.5 -8 -.25 8 -8 -.25 8.5
  [3,16,-8,0,8.5,-8,-.25,8,-8,-.25,8.5],
// 3 16 -8 0 8.5 -8 -.25 7.2 -8 -.25 8
  [3,16,-8,0,8.5,-8,-.25,7.2,-8,-.25,8],
// 3 16 -8 0 8.5 -8 -.25 4.2 -8 -.25 7.2
  [3,16,-8,0,8.5,-8,-.25,4.2,-8,-.25,7.2],
// 3 16 -8 0 8.5 -8 -.25 3.4 -8 -.25 4.2
  [3,16,-8,0,8.5,-8,-.25,3.4,-8,-.25,4.2],
// 3 16 -8 0 8.5 -8 -.25 .4 -8 -.25 3.4
  [3,16,-8,0,8.5,-8,-.25,.4,-8,-.25,3.4],
// 4 16 -8 0 8.5 -8 0 -8.5 -8 -.25 -.4 -8 -.25 .4
  [4,16,-8,0,8.5,-8,0,-8.5,-8,-.25,-.4,-8,-.25,.4],
// 3 16 -8 0 -8.5 -8 -.25 -3.4 -8 -.25 -.4
  [3,16,-8,0,-8.5,-8,-.25,-3.4,-8,-.25,-.4],
// 3 16 -8 0 -8.5 -8 -.25 -4.2 -8 -.25 -3.4
  [3,16,-8,0,-8.5,-8,-.25,-4.2,-8,-.25,-3.4],
// 3 16 -8 0 -8.5 -8 -.25 -7.2 -8 -.25 -4.2
  [3,16,-8,0,-8.5,-8,-.25,-7.2,-8,-.25,-4.2],
// 3 16 -8 0 -8.5 -8 -.25 -8 -8 -.25 -7.2
  [3,16,-8,0,-8.5,-8,-.25,-8,-8,-.25,-7.2],
// 3 16 -8 0 -8.5 -8 -.25 -8.5 -8 -.25 -8
  [3,16,-8,0,-8.5,-8,-.25,-8.5,-8,-.25,-8],
// 3 16 8 0 8.5 8 -.25 8.5 8 -.25 8
  [3,16,8,0,8.5,8,-.25,8.5,8,-.25,8],
// 3 16 8 0 8.5 8 -.25 8 8 -.25 7.2
  [3,16,8,0,8.5,8,-.25,8,8,-.25,7.2],
// 3 16 8 0 8.5 8 -.25 7.2 8 -.25 4.2
  [3,16,8,0,8.5,8,-.25,7.2,8,-.25,4.2],
// 3 16 8 0 8.5 8 -.25 4.2 8 -.25 3.4
  [3,16,8,0,8.5,8,-.25,4.2,8,-.25,3.4],
// 3 16 8 0 8.5 8 -.25 3.4 8 -.25 .4
  [3,16,8,0,8.5,8,-.25,3.4,8,-.25,.4],
// 4 16 8 0 -8.5 8 0 8.5 8 -.25 .4 8 -.25 -.4
  [4,16,8,0,-8.5,8,0,8.5,8,-.25,.4,8,-.25,-.4],
// 3 16 8 0 -8.5 8 -.25 -.4 8 -.25 -3.4
  [3,16,8,0,-8.5,8,-.25,-.4,8,-.25,-3.4],
// 3 16 8 0 -8.5 8 -.25 -3.4 8 -.25 -4.2
  [3,16,8,0,-8.5,8,-.25,-3.4,8,-.25,-4.2],
// 3 16 8 0 -8.5 8 -.25 -4.2 8 -.25 -7.2
  [3,16,8,0,-8.5,8,-.25,-4.2,8,-.25,-7.2],
// 3 16 8 0 -8.5 8 -.25 -7.2 8 -.25 -8
  [3,16,8,0,-8.5,8,-.25,-7.2,8,-.25,-8],
// 3 16 8 0 -8.5 8 -.25 -8 8 -.25 -8.5
  [3,16,8,0,-8.5,8,-.25,-8,8,-.25,-8.5],
// 4 16 -6.5 0 -10 6.5 0 -10 6.5 -.25 -10 -6.5 -.25 -10
  [4,16,-6.5,0,-10,6.5,0,-10,6.5,-.25,-10,-6.5,-.25,-10],
// 0 // Top faces
// 0 // Black faces
// 4 0 -6.5 -.25 10 -8 -.25 8.5 8 -.25 8.5 6.5 -.25 10
  [4,0,-6.5,-.25,10,-8,-.25,8.5,8,-.25,8.5,6.5,-.25,10],
// 4 0 -8 -.25 8.5 -8 -.25 8 8 -.25 8 8 -.25 8.5
  [4,0,-8,-.25,8.5,-8,-.25,8,8,-.25,8,8,-.25,8.5],
// 4 0 -8 -.25 7.2 -8 -.25 4.2 8 -.25 4.2 8 -.25 7.2
  [4,0,-8,-.25,7.2,-8,-.25,4.2,8,-.25,4.2,8,-.25,7.2],
// 4 0 -8 -.25 3.4 -8 -.25 .4 8 -.25 .4 8 -.25 3.4
  [4,0,-8,-.25,3.4,-8,-.25,.4,8,-.25,.4,8,-.25,3.4],
// 4 0 -8 -.25 -.4 -8 -.25 -3.4 8 -.25 -3.4 8 -.25 -.4
  [4,0,-8,-.25,-.4,-8,-.25,-3.4,8,-.25,-3.4,8,-.25,-.4],
// 4 0 -8 -.25 -4.2 -8 -.25 -7.2 8 -.25 -7.2 8 -.25 -4.2
  [4,0,-8,-.25,-4.2,-8,-.25,-7.2,8,-.25,-7.2,8,-.25,-4.2],
// 4 0 -8 -.25 -8 -8 -.25 -8.5 8 -.25 -8.5 8 -.25 -8
  [4,0,-8,-.25,-8,-8,-.25,-8.5,8,-.25,-8.5,8,-.25,-8],
// 4 0 -8 -.25 -8.5 -6.5 -.25 -10 6.5 -.25 -10 8 -.25 -8.5
  [4,0,-8,-.25,-8.5,-6.5,-.25,-10,6.5,-.25,-10,8,-.25,-8.5],
// 0 // Dark grey stripes
// 4 72 -8 -.25 8 -8 -.25 7.2 8 -.25 7.2 8 -.25 8
  [4,72,-8,-.25,8,-8,-.25,7.2,8,-.25,7.2,8,-.25,8],
// 4 72 -8 -.25 4.2 -8 -.25 3.4 8 -.25 3.4 8 -.25 4.2
  [4,72,-8,-.25,4.2,-8,-.25,3.4,8,-.25,3.4,8,-.25,4.2],
// 4 72 -8 -.25 .4 -8 -.25 -.4 8 -.25 -.4 8 -.25 .4
  [4,72,-8,-.25,.4,-8,-.25,-.4,8,-.25,-.4,8,-.25,.4],
// 4 72 -8 -.25 -3.4 -8 -.25 -4.2 8 -.25 -4.2 8 -.25 -3.4
  [4,72,-8,-.25,-3.4,-8,-.25,-4.2,8,-.25,-4.2,8,-.25,-3.4],
// 4 72 -8 -.25 -7.2 -8 -.25 -8 8 -.25 -8 8 -.25 -7.2
  [4,72,-8,-.25,-7.2,-8,-.25,-8,8,-.25,-8,8,-.25,-7.2],
];
module ldraw_lib__6142275h(step=0, col=false, unit=2/5, alt=false, line=0.2, solid=!$preview)
    makepoly(ldraw_lib__6142275h(), step=step, col=col, unit=unit, alt=alt, line=line, solid=solid);
ldraw_lib__6142275h(line=0.2);
// file: 3005.scad
use <../lib.scad>
use <s/3005s01.scad>
function ldraw_lib__3005() = [
// 0 Brick  1 x  1
// 0 Name: 3005.dat
// 0 Author: James Jessiman
// 0 !LDRAW_ORG Part UPDATE 2022-05
// 0 !LICENSE Licensed under CC BY 2.0 and CC BY 4.0 : see CAreadme.txt
// 
// 0 BFC CERTIFY CCW
  [0,"BFC","CERTIFY"],
  [0,"BFC","CCW"],
// 
// 0 !HISTORY 2001-10-26 [PTadmin] Official Update 2001-01
// 0 !HISTORY 2002-05-07 {unknown} BFC Certification
// 0 !HISTORY 2002-06-11 [PTadmin] Official Update 2002-03
// 0 !HISTORY 2007-05-07 [PTadmin] Header formatted for Contributor Agreement
// 0 !HISTORY 2008-07-01 [PTadmin] Official Update 2008-01
// 0 !HISTORY 2022-08-04 [MagFors] Using subfile
// 0 !HISTORY 2022-09-15 [PTadmin] Official Update 2022-05
// 
// 
// 1 16 0 0 0 1 0 0 0 1 0 0 0 1 s\3005s01.dat
  [1,16,0,0,0,1,0,0,0,1,0,0,0,1, ldraw_lib__s__3005s01()],
// 4 16 -10 24 -10 10 24 -10 10 0 -10 -10 0 -10
  [4,16,-10,24,-10,10,24,-10,10,0,-10,-10,0,-10],
];
module ldraw_lib__3005(step=0, col=false, unit=2/5, alt=false, line=0.2, solid=!$preview)
    makepoly(ldraw_lib__3005(), step=step, col=col, unit=unit, alt=alt, line=line, solid=solid);
ldraw_lib__3005(line=0.2);
// main file
use <../lib.scad>
use <3005.scad>
use <6142275h.scad>
function ldraw_lib__3005d0a() = [
// 0 Brick  1 x  1 with  5 Dark Grey Stripes on Black Background Sticker
// 0 Name: 3005d0a.dat
// 0 Author: Vincent Messenet [Cheenzo]
// 0 !LDRAW_ORG Shortcut UPDATE 2026-05
// 0 !LICENSE Licensed under CC BY 4.0 : see CAreadme.txt
// 
// 0 BFC CERTIFY CCW
  [0,"BFC","CERTIFY"],
  [0,"BFC","CCW"],
// 
// 0 !CATEGORY Sticker Shortcut
// 
// 0 !KEYWORDS Bricklink 3005pb047, Set 75872
// 
// 0 !HISTORY 2026-05-31 [OrionP] Official Update 2026-05
// 
// 1 16 0 0 0 1 0 0 0 1 0 0 0 1 3005.dat
  [1,16,0,0,0,1,0,0,0,1,0,0,0,1, ldraw_lib__3005()],
// 1 16 0 12 -10 1 0 0 0 0 -1 0 1 0 6142275h.dat
  [1,16,0,12,-10,1,0,0,0,0,-1,0,1,0, ldraw_lib__6142275h()],
];
module ldraw_lib__3005d0a(step=0, col=false, unit=2/5, alt=false, line=0.2, solid=!$preview)
    makepoly(ldraw_lib__3005d0a(), step=step, col=col, unit=unit, alt=alt, line=line, solid=solid);
ldraw_lib__3005d0a(line=0.2);
